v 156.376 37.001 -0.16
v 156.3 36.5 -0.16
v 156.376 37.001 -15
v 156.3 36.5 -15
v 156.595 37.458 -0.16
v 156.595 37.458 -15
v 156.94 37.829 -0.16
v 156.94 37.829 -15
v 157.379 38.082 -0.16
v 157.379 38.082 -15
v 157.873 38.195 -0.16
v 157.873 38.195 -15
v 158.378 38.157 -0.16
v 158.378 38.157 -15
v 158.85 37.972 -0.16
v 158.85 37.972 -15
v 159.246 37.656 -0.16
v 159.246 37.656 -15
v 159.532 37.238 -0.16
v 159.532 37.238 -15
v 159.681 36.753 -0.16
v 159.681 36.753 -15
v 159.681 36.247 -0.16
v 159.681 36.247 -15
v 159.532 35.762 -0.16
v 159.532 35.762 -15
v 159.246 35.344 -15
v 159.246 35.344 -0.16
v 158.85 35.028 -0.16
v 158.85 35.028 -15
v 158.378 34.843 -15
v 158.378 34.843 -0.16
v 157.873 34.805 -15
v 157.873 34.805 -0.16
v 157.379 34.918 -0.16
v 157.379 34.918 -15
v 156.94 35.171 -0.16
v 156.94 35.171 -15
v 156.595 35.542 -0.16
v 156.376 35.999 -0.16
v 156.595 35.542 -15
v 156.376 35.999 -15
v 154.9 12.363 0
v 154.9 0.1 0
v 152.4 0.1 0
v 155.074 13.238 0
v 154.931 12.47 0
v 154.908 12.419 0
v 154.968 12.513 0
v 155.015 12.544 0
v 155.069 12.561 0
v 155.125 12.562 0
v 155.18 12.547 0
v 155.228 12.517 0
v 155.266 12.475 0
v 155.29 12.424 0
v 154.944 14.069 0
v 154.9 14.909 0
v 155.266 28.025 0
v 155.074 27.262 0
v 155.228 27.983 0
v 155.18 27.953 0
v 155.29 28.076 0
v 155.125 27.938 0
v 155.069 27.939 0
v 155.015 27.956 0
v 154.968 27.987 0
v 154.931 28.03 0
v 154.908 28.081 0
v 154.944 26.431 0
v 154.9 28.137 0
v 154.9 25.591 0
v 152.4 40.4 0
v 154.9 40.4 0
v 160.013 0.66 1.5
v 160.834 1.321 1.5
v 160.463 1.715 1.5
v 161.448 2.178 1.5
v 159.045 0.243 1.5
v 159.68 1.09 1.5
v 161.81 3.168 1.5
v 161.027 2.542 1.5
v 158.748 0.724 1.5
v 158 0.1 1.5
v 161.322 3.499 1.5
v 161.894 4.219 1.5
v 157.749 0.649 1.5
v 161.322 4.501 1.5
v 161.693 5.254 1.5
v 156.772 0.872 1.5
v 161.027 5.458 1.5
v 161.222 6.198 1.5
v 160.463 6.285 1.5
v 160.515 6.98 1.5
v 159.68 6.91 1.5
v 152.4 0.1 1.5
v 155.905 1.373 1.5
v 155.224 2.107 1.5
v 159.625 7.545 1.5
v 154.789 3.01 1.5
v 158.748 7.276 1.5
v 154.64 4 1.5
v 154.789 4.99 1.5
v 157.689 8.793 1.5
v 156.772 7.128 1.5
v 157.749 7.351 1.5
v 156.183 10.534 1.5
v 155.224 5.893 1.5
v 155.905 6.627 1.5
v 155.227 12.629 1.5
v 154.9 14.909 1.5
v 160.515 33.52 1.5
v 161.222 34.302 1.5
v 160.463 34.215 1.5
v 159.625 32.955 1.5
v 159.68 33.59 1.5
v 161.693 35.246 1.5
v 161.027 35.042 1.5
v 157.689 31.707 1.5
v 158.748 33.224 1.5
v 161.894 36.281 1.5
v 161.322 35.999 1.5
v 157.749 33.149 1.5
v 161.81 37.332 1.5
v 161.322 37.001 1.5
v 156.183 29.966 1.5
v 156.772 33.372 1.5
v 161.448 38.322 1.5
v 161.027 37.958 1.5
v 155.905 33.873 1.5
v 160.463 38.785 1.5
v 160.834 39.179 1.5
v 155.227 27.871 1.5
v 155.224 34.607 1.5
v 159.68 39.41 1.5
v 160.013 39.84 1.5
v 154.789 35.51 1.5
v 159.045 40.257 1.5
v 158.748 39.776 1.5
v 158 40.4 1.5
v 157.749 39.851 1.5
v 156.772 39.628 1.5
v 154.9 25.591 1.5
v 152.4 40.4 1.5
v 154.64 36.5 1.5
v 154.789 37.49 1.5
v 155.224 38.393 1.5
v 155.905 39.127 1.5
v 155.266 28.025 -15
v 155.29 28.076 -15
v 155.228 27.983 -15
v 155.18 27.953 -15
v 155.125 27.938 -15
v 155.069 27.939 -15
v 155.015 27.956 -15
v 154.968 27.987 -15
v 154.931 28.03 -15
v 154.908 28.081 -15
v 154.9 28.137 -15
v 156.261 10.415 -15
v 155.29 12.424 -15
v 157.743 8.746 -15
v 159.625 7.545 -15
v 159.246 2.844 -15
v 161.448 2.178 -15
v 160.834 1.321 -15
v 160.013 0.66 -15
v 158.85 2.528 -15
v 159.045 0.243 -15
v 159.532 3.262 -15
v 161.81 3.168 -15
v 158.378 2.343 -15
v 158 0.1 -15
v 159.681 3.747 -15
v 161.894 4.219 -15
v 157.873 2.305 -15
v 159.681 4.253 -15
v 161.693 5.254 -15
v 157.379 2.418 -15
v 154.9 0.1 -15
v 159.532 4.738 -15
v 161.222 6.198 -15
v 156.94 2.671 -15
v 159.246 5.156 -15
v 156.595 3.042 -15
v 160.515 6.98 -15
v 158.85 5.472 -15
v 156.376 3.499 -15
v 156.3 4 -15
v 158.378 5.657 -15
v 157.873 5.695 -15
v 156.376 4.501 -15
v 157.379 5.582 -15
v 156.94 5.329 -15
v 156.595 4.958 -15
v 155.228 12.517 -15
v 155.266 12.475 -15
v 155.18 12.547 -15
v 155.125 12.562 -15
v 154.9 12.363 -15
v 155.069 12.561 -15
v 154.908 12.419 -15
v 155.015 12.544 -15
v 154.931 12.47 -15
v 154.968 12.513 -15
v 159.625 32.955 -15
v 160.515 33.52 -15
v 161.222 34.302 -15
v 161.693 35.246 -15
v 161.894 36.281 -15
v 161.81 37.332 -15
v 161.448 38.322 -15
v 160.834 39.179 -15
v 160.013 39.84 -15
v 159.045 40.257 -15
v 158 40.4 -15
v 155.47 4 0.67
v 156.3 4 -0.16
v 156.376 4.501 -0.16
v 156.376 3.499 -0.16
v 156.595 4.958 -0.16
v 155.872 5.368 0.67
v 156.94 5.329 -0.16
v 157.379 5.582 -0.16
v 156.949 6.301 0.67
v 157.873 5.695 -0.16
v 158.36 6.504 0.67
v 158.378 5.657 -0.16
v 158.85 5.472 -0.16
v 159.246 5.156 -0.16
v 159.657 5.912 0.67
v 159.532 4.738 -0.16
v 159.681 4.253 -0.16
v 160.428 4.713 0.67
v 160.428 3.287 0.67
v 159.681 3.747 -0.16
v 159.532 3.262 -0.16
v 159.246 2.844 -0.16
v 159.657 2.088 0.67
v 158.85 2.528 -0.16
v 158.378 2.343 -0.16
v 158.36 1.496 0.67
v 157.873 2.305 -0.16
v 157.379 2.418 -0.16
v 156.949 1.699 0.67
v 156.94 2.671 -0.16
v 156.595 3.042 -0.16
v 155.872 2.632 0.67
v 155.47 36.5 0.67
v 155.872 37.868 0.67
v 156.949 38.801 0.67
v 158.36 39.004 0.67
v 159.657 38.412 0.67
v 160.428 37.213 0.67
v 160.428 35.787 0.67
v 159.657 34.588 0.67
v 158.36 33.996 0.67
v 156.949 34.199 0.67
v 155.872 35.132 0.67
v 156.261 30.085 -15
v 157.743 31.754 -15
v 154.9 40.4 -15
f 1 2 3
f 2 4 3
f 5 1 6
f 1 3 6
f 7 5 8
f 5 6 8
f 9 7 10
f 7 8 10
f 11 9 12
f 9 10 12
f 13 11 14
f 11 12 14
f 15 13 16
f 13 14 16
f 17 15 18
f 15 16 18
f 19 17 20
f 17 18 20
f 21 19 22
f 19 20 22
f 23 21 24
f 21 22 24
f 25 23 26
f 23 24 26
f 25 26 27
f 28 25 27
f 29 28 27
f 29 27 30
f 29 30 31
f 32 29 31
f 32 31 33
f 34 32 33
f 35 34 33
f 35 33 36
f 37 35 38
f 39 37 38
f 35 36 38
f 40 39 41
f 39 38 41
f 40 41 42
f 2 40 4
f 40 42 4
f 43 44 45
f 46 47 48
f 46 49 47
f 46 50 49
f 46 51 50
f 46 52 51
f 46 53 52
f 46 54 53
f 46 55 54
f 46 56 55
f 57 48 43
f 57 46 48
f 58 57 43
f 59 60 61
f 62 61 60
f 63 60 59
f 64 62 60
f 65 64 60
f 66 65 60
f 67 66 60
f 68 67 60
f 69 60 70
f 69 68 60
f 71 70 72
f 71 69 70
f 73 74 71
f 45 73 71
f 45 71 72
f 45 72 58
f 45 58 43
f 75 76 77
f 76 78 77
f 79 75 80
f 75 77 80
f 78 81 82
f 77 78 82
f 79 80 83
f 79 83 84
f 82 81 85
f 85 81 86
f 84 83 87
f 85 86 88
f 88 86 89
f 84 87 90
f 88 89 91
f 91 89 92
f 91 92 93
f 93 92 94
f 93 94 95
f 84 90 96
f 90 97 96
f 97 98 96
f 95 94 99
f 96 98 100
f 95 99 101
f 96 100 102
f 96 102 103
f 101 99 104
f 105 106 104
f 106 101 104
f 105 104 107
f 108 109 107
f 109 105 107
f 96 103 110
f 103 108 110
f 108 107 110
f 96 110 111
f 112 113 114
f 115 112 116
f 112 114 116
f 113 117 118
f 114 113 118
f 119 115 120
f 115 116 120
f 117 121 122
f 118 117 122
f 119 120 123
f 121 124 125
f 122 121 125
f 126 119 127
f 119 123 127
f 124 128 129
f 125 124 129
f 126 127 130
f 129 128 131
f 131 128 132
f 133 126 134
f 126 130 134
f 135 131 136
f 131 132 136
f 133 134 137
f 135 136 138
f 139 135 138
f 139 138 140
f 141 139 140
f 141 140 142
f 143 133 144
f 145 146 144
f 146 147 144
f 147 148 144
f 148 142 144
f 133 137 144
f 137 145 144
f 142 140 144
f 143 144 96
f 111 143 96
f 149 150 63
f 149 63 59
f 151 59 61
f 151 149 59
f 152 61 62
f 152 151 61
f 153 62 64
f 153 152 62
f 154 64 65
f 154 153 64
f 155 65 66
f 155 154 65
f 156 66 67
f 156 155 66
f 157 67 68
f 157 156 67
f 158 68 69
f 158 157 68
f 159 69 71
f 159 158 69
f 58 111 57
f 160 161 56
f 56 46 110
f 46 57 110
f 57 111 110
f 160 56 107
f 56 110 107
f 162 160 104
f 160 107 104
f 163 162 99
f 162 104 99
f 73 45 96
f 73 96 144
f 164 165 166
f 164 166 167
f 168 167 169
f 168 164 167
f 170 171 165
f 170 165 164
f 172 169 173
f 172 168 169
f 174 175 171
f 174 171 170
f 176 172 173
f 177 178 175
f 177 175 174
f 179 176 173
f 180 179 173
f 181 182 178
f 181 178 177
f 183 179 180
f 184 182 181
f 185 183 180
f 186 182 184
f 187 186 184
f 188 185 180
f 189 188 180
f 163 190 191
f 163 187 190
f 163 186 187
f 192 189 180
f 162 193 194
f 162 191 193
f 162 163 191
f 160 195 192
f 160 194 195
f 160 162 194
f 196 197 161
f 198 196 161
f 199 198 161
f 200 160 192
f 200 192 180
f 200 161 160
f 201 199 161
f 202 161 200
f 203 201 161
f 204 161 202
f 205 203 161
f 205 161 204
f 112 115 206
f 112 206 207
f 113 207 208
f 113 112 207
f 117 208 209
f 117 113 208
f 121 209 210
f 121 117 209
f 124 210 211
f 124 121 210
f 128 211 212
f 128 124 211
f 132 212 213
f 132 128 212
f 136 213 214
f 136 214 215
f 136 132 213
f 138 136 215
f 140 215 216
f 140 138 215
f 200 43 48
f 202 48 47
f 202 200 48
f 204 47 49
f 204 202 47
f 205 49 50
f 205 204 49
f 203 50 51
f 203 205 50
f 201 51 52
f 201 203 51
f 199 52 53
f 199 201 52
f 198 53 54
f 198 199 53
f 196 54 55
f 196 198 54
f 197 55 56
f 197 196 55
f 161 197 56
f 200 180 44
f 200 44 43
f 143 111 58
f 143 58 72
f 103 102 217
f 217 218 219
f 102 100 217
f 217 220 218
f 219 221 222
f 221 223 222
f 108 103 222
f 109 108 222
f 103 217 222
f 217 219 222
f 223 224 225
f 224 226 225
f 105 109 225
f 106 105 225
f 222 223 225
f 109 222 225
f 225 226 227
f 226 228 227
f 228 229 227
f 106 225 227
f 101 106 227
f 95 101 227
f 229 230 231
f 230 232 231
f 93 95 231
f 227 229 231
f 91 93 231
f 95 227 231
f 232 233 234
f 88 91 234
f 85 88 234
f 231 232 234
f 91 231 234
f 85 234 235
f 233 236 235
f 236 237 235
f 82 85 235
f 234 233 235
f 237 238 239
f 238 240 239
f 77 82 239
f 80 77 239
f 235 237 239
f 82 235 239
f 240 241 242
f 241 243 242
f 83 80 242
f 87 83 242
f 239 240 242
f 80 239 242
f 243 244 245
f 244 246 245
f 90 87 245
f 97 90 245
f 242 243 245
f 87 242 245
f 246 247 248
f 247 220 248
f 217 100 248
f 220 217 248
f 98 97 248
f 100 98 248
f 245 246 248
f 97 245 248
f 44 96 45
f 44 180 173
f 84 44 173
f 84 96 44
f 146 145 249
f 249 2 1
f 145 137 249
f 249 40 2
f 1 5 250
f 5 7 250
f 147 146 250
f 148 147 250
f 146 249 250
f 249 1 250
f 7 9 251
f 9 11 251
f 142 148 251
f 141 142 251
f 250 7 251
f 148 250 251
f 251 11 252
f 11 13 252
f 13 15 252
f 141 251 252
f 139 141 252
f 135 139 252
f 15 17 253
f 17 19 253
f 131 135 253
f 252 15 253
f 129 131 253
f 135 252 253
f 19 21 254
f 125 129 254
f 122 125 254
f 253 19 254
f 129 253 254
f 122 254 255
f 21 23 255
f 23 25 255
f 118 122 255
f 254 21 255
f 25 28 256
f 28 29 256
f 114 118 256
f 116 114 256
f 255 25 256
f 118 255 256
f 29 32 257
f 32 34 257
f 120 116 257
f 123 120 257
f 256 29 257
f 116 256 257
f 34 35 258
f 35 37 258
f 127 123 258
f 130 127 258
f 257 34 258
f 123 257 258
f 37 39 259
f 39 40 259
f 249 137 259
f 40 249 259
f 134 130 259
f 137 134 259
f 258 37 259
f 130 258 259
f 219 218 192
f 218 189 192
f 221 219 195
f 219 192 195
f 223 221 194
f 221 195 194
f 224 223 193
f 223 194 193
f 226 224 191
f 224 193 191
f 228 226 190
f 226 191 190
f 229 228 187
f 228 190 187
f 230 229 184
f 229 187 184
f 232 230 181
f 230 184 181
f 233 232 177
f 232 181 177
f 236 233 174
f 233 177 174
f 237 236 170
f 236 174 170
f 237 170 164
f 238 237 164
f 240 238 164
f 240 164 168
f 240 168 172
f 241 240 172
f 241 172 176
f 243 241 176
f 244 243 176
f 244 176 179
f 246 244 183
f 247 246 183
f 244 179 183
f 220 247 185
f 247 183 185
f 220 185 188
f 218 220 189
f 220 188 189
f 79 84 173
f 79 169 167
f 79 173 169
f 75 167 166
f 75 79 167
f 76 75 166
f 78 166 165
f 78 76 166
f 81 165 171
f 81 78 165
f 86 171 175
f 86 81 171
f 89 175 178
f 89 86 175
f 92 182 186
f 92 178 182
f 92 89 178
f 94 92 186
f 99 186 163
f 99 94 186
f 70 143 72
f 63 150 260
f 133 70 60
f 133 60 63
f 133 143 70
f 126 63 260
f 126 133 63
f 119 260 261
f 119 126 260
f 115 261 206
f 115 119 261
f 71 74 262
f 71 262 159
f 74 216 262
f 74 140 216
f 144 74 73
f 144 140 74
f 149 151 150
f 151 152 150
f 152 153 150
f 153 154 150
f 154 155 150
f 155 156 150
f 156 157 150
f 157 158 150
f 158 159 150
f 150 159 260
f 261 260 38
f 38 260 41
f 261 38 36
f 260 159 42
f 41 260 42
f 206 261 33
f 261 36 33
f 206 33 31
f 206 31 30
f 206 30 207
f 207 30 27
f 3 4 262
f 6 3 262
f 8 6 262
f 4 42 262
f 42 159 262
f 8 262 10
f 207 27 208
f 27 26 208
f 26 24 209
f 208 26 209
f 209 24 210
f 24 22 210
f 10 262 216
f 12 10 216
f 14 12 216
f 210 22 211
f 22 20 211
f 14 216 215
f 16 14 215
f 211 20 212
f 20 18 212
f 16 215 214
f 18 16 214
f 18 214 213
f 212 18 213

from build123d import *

# Parameters (mm, degrees)
SKETCH_1_W                  = 155
SKETCH_1_H                  = 40.5
EXTRUDE_1_DEPTH             = 1.5
EXTRUDE_2_DEPTH             = 1.5
FILLET_2_R                  = 8
CUT_EXTRUDE_1_DEPTH         = 167.992514924
SKETCH_5_W                  = 152.3
SKETCH_5_H                  = 40.3
CUT_EXTRUDE_2_DEPTH         = 167.871267749
EXTRUDE_3_DEPTH             = 15
FILLET_START                = -16
FILLET_3_DEPTH              = 16
HOLE_WIZARD_M31_D           = 3.4
HOLE_WIZARD_M31_CSINK_D     = 6.72
HOLE_WIZARD_M31_CSINK_ANGLE = 90


with BuildPart() as part:
    # Эскиз1 → Бобышка-Вытянуть1 (new body)
    with BuildSketch(Plane.XY):
        with Locations((77.5, 20.25)):
            Rectangle(SKETCH_1_W, SKETCH_1_H)
    extrude(amount=EXTRUDE_1_DEPTH)

    # Эскиз2 → Бобышка-Вытянуть2 (add)
    with BuildSketch(Plane(origin=(0, 0, 0), x_dir=(-1, 0, 0), z_dir=(0, 0, -1))):
        with BuildLine():
            Line((-158, 0), (-155, 0))
            Line((-155, 0), (-155, 8))
            Line((-155, 8), (-158, 8))
            ThreePointArc((-158, 8), (-162, 4), (-158, 0))
        make_face()
        with BuildLine():
            Line((-155, 32.5), (-155, 40.5))
            Line((-155, 40.5), (-158, 40.5))
            ThreePointArc((-158, 40.5), (-162, 36.5), (-158, 32.5))
            Line((-158, 32.5), (-155, 32.5))
        make_face()
    extrude(amount=-EXTRUDE_2_DEPTH)

    # Скругление2
    fillet_2_edges = [part.edges().sort_by_distance(p)[0] for p in [
        (155, 8, 0.75),
        (155, 32.5, 0.75),
    ]]
    fillet(fillet_2_edges, radius=FILLET_2_R)

    # Эскиз3 → Вырез-Вытянуть1 (cut, through all)
    with BuildSketch(Plane.XY.offset(1.5)):
        with BuildLine():
            Line((155, 14.908712115), (155, 25.591287885))
            ThreePointArc((155, 25.591287885), (156.266996708, 29.911781684), (159.666666667, 32.863762628))
            ThreePointArc((159.666666667, 32.863762628), (161.908001374, 37.352950911), (158, 40.5))
            Line((158, 40.5), (0, 40.5))
            Line((0, 40.5), (0, 0))
            Line((0, 0), (158, 0))
            ThreePointArc((158, 0), (161.908001374, 3.147049089), (159.666666667, 7.636237372))
            ThreePointArc((159.666666667, 7.636237372), (156.266996708, 10.588218316), (155, 14.908712115))
        make_face()
        with BuildLine():
            Line((154.9, 14.908712115), (154.9, 25.591287885))
            ThreePointArc((154.9, 25.591287885), (156.182834167, 29.965787857), (159.625, 32.954668563))
            ThreePointArc((159.625, 32.954668563), (161.81030134, 37.331627138), (158, 40.4))
            Line((158, 40.4), (0.1, 40.4))
            Line((0.1, 40.4), (0.1, 0.1))
            Line((0.1, 0.1), (158, 0.1))
            ThreePointArc((158, 0.1), (161.81030134, 3.168372862), (159.625, 7.545331437))
            ThreePointArc((159.625, 7.545331437), (156.182834167, 10.534212143), (154.9, 14.908712115))
        make_face(mode=Mode.SUBTRACT)
    extrude(amount=-CUT_EXTRUDE_1_DEPTH, mode=Mode.SUBTRACT)

    # Эскиз5 → Вырез-Вытянуть2 (cut, through all)
    with BuildSketch(Plane(origin=(0, 0, 0), x_dir=(-1, 0, 0), z_dir=(0, 0, -1))):
        with Locations((-76.25, 20.25)):
            Rectangle(SKETCH_5_W, SKETCH_5_H)
    extrude(amount=-CUT_EXTRUDE_2_DEPTH, mode=Mode.SUBTRACT)

    # Эскиз6 → Бобышка-Вытянуть3 (add)
    with BuildSketch(Plane(origin=(0, 0, 0), x_dir=(-1, 0, 0), z_dir=(0, 0, -1))):
        with BuildLine():
            Line((-154.9, 40.4), (-154.9, 25.591287885))
            ThreePointArc((-154.9, 25.591287885), (-156.182834167, 29.965787857), (-159.625, 32.954668563))
            ThreePointArc((-159.625, 32.954668563), (-161.81030134, 37.331627138), (-158, 40.4))
            Line((-158, 40.4), (-154.9, 40.4))
        make_face()
        with BuildLine():
            Line((-154.9, 0.1), (-154.9, 14.908712115))
            ThreePointArc((-154.9, 14.908712115), (-156.182834167, 10.534212143), (-159.625, 7.545331437))
            ThreePointArc((-159.625, 7.545331437), (-161.81030134, 3.168372862), (-158, 0.1))
            Line((-158, 0.1), (-154.9, 0.1))
        make_face()
    extrude(amount=EXTRUDE_3_DEPTH)

    # Скругление3: read off the stored shape, not the designer's step
    # Скругление3 outline → Скругление3 (cut)
    with BuildSketch(Plane.XY.offset(FILLET_START)):
        with BuildLine():
            ThreePointArc((154.9, 12.363127702), (155.068953979, 12.56070337), (155.290361446, 12.424467086))
            ThreePointArc((155.290361446, 12.424467086), (154.998185447, 13.651348263), (154.9, 14.908712115))
            Line((154.9, 14.908712115), (154.9, 12.363127702))
        make_face()
        with BuildLine():
            ThreePointArc((155.290361446, 28.075532914), (155.068953979, 27.93929663), (154.9, 28.136872298))
            Line((154.9, 28.136872298), (154.9, 25.591287885))
            ThreePointArc((154.9, 25.591287885), (154.998185447, 26.848651737), (155.290361446, 28.075532914))
        make_face()
    extrude(amount=FILLET_3_DEPTH, mode=Mode.SUBTRACT)

    # Зенковка для  винта с потайной головкой с внутренним шестигранником M31 (through all)
    with Locations(Plane.XY.offset(1.5)):
        with Locations((158, 36.5), (158, 4)):
            CounterSinkHole(HOLE_WIZARD_M31_D / 2, HOLE_WIZARD_M31_CSINK_D / 2, counter_sink_angle=HOLE_WIZARD_M31_CSINK_ANGLE)


solid = part.part
